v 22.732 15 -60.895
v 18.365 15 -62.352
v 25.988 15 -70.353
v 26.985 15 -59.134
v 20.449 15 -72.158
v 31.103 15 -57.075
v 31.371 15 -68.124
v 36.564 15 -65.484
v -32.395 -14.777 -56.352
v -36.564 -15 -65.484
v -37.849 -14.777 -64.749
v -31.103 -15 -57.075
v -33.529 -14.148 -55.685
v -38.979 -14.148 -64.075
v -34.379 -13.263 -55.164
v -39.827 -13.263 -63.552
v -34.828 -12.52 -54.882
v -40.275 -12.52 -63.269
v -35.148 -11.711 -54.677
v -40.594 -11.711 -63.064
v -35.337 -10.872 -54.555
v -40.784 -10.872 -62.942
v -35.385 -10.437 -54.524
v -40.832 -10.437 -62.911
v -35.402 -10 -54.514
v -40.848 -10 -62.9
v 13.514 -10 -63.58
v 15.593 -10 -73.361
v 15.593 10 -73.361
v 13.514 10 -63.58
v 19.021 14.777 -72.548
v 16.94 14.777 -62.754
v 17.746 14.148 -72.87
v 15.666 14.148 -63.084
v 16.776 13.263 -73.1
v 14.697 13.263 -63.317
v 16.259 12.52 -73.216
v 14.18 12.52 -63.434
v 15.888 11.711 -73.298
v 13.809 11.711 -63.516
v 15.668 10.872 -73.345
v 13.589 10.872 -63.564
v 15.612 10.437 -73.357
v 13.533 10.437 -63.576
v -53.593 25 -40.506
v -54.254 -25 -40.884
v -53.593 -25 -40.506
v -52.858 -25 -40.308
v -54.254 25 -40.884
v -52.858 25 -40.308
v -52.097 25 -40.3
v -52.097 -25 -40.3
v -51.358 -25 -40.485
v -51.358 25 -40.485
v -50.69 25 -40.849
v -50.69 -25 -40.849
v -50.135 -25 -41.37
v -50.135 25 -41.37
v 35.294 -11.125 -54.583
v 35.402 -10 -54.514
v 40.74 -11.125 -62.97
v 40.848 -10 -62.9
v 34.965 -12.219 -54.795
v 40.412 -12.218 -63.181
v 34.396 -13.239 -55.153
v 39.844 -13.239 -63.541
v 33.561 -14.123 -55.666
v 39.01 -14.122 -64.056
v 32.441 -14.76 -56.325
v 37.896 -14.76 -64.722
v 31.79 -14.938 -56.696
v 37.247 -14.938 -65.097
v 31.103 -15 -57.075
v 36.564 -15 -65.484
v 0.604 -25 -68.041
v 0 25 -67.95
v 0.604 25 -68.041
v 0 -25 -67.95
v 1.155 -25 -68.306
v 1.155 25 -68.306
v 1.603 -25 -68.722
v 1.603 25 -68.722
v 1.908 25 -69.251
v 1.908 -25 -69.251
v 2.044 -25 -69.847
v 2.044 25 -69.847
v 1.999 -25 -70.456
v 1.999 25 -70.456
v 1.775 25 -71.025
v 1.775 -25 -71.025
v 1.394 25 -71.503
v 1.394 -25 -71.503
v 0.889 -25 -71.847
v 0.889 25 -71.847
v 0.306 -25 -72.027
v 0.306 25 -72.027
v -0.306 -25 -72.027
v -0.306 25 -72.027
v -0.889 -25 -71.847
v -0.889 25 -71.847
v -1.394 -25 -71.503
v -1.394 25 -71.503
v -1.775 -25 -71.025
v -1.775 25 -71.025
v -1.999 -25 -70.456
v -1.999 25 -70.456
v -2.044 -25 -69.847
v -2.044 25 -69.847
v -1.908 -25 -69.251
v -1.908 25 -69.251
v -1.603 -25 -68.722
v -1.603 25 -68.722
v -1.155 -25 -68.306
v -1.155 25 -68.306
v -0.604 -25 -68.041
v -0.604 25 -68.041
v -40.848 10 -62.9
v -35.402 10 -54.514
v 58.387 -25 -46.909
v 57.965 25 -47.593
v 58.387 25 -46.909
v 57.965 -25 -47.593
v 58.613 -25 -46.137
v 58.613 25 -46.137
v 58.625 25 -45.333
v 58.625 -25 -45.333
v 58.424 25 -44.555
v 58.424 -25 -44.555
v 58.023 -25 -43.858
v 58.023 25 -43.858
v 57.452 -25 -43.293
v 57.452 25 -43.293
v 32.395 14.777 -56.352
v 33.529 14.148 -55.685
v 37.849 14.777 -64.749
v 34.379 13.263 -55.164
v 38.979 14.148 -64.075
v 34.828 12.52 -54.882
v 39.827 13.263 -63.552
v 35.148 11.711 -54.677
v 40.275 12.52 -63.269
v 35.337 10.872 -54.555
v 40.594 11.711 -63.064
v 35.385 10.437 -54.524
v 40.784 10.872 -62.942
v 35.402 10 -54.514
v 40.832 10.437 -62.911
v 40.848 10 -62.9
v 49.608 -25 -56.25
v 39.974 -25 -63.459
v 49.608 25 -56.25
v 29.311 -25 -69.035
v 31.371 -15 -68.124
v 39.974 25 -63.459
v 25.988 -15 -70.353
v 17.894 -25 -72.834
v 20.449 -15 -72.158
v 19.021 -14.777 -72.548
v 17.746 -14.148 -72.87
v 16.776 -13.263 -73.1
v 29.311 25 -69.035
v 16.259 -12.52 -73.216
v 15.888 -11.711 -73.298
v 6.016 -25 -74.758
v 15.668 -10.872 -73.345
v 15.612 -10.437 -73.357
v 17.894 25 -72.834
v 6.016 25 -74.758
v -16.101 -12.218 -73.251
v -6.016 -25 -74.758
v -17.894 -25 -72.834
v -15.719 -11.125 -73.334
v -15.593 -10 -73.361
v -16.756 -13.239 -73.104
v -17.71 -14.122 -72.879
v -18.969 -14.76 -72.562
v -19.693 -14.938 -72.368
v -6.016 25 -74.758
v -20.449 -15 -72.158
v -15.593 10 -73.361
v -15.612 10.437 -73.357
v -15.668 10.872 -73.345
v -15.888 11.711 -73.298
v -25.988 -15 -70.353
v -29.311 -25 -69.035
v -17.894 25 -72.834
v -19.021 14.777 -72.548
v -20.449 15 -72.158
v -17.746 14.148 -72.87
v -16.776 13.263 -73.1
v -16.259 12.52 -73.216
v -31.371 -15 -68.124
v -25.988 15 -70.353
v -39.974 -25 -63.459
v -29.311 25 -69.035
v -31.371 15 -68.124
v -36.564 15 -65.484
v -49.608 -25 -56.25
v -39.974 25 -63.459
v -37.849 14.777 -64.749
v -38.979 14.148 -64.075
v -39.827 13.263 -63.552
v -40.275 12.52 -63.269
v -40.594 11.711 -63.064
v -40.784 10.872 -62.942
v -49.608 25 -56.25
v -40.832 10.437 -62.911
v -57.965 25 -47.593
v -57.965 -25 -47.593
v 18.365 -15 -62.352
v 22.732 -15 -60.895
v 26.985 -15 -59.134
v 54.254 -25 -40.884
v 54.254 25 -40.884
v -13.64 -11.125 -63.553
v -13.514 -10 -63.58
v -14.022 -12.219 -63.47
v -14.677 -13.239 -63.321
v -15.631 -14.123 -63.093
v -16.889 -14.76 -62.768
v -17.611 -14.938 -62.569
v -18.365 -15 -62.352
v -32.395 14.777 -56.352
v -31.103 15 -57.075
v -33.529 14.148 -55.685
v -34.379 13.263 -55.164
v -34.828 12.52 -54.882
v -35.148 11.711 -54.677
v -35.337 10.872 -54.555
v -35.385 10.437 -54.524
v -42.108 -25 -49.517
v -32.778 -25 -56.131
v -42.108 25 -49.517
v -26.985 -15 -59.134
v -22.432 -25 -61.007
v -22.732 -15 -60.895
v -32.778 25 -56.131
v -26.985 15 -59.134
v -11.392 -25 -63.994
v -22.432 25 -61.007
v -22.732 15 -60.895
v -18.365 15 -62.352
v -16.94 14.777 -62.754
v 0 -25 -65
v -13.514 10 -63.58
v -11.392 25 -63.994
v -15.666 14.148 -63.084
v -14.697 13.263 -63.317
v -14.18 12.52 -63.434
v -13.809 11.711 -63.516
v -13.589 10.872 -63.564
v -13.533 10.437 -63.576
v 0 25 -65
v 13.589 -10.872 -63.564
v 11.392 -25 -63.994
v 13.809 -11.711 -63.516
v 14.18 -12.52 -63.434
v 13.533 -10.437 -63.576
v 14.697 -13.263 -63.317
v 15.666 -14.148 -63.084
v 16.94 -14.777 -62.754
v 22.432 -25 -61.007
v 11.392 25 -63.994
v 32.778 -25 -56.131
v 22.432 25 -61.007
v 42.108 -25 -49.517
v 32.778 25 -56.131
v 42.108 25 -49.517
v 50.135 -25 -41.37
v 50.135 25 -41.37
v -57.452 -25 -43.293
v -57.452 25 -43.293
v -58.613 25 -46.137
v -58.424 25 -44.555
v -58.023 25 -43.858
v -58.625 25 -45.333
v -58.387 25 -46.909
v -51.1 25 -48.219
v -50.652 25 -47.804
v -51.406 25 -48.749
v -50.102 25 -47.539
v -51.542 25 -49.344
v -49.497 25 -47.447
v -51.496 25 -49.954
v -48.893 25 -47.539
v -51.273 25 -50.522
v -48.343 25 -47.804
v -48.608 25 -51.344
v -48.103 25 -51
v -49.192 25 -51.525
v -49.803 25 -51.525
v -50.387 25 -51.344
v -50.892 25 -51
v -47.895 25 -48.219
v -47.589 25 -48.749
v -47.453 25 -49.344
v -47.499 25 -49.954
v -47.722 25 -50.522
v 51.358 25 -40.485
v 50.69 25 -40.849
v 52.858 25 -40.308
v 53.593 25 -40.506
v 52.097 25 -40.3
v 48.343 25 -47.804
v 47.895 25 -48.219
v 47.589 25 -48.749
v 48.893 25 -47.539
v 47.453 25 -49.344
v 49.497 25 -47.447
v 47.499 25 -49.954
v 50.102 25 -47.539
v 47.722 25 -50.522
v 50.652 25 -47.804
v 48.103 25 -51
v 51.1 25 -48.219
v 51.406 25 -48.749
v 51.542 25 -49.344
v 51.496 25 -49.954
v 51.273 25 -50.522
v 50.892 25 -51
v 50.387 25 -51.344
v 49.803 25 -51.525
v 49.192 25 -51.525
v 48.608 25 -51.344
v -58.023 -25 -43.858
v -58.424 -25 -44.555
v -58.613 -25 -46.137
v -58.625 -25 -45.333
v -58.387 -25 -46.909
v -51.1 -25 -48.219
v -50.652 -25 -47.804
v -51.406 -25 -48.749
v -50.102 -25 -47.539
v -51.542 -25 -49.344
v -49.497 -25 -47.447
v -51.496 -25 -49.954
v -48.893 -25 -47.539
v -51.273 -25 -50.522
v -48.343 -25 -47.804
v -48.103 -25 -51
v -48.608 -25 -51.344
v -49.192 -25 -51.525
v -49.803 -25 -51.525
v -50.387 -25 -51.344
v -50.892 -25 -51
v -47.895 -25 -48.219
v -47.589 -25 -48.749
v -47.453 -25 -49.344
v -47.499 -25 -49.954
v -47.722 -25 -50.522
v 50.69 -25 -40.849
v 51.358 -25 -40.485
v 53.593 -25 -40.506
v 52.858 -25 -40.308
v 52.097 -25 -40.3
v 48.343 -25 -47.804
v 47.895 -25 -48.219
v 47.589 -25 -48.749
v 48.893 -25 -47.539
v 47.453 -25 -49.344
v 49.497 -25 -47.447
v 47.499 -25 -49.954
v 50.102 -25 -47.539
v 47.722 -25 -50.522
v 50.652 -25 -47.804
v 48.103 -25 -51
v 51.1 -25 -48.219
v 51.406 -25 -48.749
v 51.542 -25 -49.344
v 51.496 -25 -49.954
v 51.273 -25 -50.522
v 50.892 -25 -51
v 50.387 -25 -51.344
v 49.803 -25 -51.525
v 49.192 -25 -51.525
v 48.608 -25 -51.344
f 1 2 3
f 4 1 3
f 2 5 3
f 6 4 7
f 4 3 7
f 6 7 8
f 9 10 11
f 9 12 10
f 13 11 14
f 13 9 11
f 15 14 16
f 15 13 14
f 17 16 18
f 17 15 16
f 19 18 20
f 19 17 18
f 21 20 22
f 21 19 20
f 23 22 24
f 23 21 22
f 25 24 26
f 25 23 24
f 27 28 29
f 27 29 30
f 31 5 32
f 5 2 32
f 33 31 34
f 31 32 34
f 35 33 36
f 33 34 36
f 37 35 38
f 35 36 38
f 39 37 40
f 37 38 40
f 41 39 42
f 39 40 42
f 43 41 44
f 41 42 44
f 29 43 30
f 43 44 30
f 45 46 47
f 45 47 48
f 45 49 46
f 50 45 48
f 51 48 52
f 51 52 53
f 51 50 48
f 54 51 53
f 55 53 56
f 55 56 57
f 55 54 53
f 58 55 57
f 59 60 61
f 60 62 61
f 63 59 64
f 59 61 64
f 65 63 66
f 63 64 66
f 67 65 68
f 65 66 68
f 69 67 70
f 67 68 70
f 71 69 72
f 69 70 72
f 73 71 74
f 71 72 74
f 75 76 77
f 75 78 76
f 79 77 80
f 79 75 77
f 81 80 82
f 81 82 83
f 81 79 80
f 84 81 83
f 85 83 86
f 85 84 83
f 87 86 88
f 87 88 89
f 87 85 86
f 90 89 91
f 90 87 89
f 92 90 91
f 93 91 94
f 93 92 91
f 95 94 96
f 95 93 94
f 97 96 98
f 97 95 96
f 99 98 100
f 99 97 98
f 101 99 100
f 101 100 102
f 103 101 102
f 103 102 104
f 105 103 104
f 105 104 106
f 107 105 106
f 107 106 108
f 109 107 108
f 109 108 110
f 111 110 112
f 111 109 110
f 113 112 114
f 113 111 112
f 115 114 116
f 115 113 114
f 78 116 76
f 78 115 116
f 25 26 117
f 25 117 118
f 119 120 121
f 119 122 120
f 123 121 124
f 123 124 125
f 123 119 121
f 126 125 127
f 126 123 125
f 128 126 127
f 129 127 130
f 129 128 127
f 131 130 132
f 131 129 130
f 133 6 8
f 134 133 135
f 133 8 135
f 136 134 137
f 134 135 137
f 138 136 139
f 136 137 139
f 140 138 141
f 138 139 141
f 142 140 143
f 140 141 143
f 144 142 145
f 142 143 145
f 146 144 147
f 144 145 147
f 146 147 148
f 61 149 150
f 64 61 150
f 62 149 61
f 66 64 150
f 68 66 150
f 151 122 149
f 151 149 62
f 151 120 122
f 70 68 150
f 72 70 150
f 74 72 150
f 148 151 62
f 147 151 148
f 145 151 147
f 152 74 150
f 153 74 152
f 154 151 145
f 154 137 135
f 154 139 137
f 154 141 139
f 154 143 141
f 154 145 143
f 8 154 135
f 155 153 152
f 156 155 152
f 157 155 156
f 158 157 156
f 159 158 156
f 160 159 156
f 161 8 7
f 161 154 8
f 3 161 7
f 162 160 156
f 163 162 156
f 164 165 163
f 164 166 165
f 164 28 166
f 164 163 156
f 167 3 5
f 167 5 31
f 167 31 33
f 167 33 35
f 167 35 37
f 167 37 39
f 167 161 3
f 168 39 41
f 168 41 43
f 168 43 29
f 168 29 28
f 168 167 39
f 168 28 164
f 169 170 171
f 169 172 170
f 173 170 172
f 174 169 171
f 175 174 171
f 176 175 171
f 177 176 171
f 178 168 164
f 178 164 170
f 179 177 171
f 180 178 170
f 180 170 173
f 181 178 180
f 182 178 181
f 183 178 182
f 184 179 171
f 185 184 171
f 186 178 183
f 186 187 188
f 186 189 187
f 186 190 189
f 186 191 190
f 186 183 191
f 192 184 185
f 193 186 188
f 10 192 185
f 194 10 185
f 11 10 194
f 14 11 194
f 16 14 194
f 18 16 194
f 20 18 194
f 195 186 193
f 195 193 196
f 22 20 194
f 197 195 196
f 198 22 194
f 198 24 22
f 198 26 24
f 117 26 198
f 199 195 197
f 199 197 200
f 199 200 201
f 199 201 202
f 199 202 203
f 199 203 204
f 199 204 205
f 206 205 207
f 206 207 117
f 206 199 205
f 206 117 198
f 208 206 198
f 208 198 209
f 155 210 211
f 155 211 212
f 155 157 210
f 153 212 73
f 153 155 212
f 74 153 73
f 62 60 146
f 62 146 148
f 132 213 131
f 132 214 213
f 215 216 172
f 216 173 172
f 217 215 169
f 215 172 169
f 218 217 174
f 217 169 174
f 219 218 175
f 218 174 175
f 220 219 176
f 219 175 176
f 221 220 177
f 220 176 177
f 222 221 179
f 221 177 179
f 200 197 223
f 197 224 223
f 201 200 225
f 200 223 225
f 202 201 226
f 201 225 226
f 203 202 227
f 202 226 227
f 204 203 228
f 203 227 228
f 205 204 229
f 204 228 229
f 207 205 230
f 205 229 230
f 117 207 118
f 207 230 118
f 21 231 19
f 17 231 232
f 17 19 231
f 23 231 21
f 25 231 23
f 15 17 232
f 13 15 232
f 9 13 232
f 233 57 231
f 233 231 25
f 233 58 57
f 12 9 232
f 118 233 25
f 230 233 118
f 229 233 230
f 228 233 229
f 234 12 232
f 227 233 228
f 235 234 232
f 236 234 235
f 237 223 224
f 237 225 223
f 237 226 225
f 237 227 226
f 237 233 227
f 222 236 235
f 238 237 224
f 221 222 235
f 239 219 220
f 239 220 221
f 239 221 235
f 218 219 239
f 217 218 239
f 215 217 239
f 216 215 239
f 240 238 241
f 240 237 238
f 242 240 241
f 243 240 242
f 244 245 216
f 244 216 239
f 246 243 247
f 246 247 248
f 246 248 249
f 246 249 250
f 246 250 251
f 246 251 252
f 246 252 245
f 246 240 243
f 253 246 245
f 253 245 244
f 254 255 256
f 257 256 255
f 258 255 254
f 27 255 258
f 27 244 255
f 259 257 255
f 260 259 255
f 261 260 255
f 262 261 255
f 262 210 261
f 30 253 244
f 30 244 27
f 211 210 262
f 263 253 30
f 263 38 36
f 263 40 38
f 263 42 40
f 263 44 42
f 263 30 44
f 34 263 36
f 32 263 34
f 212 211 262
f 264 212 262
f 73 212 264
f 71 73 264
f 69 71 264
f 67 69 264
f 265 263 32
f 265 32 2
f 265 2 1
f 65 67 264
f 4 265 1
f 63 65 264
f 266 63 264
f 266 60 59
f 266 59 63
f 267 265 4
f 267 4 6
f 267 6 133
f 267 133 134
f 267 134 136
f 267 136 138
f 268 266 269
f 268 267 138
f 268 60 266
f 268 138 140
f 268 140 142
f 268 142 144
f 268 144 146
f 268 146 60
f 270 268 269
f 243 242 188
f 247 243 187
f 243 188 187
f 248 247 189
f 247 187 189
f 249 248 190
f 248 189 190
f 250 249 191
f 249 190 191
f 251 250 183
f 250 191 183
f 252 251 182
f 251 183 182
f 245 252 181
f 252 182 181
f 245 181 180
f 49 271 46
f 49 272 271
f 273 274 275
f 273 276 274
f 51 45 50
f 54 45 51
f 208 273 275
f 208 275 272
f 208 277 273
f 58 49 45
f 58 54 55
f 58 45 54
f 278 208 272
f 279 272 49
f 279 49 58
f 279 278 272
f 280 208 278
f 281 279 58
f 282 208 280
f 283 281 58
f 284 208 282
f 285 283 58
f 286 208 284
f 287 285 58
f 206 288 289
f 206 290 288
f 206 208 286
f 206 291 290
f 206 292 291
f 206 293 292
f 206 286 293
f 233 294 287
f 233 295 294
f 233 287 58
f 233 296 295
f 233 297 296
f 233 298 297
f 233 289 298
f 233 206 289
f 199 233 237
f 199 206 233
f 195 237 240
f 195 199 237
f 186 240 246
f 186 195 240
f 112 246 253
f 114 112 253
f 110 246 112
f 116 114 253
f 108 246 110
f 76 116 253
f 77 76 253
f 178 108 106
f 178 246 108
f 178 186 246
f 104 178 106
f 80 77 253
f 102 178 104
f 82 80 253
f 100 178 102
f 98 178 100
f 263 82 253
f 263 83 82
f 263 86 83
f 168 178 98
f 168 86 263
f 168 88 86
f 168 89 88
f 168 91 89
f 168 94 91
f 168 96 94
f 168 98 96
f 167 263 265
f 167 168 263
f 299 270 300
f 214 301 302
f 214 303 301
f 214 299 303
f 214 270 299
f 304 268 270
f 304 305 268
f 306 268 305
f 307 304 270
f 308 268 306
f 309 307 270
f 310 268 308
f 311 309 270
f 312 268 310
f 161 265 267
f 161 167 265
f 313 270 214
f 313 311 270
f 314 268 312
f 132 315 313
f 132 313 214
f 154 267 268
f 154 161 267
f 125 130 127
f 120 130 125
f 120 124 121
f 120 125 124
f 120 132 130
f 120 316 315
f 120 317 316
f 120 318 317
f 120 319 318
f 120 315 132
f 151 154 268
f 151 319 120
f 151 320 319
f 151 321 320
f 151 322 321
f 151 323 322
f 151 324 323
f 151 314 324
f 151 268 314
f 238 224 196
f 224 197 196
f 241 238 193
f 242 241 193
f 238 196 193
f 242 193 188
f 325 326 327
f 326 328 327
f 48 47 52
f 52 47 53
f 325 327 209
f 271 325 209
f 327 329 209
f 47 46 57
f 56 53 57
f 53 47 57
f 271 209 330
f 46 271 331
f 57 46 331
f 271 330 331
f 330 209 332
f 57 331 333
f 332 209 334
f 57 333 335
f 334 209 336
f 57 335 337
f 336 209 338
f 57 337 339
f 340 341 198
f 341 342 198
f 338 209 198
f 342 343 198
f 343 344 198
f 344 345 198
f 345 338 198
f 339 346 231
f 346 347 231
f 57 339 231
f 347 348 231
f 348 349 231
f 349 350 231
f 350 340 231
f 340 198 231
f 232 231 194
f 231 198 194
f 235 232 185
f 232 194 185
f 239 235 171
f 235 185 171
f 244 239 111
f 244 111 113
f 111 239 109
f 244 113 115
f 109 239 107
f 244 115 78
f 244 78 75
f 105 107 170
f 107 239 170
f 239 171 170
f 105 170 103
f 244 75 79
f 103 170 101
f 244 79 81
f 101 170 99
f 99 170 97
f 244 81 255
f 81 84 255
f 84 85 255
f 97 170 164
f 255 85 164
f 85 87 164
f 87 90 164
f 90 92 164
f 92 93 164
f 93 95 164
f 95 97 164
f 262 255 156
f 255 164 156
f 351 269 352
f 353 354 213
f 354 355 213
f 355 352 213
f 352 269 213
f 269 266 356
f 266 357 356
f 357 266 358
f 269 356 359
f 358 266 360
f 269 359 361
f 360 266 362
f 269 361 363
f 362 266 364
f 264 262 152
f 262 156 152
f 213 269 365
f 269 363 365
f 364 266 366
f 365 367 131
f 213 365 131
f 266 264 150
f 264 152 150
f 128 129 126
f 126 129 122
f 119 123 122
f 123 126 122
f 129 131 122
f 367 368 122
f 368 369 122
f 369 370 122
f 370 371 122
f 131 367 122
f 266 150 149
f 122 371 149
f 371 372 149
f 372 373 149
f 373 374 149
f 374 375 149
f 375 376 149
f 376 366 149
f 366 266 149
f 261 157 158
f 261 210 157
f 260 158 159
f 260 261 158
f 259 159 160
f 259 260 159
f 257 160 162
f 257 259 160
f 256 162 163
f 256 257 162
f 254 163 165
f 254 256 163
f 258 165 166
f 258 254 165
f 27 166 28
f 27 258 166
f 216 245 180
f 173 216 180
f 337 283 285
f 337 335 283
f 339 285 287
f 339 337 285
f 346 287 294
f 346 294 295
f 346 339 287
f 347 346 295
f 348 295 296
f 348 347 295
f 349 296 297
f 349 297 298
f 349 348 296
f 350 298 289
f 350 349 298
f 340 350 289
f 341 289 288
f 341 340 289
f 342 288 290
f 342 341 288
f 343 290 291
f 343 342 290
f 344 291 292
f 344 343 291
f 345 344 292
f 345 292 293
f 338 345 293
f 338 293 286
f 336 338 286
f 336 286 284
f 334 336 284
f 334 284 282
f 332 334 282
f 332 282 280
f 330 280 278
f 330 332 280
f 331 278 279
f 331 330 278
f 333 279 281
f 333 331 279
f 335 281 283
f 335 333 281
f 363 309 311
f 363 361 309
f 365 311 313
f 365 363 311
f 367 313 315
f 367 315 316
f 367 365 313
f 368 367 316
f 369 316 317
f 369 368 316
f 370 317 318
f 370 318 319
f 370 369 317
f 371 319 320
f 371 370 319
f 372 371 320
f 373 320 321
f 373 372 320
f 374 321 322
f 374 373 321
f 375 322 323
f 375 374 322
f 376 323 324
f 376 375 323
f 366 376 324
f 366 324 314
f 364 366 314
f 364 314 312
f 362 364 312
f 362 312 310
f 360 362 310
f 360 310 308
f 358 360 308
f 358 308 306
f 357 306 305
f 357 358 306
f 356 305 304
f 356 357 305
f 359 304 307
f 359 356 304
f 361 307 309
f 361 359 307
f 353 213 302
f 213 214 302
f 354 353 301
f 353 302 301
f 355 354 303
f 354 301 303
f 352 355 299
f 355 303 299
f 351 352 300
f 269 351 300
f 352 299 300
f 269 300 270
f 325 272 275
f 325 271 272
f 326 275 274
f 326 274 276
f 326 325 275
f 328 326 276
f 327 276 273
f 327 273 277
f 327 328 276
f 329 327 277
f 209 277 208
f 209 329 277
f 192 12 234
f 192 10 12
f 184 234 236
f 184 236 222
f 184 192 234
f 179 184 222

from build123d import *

# Parameters (mm, degrees)
SKETCH_1_R          = 2.05
EXTRUDE_1_DEPTH     = 25
FILLET_2_R          = 3
CUT_EXTRUDE_1_DEPTH = 15
FILLET_3_R          = 5


with BuildPart() as part:
    # 草图1 → 凸台-拉伸1 (new, symmetric)
    with BuildSketch(Plane(origin=(0, 0, 0), x_dir=(1, 0, 0), z_dir=(0, 1, 0))):
        with BuildLine():
            Line((-59.897663254, 45.136126736), (-51.911308153, 39.117976505))
            ThreePointArc((-51.911308153, 39.117976505), (0, 65), (51.911308153, 39.117976505))
            Line((51.911308153, 39.117976505), (59.897663254, 45.136126736))
            ThreePointArc((59.897663254, 45.136126736), (0, 75), (-59.897663254, 45.136126736))
        make_face()
        with Locations(Location((-49.497474683, 49.497474683, 0), (0, 0, 270))):
            Circle(SKETCH_1_R, mode=Mode.SUBTRACT)
        with Locations(Location((0, 70, 0), (0, 0, 270))):
            Circle(SKETCH_1_R, mode=Mode.SUBTRACT)
        with Locations(Location((49.497474683, 49.497474683, 0), (0, 0, 270))):
            Circle(SKETCH_1_R, mode=Mode.SUBTRACT)
    extrude(amount=EXTRUDE_1_DEPTH, both=True)

    # 圆角2
    fillet_2_edges = [part.edges().sort_by_distance(p)[0] for p in [
        (-51.911308153, 0, -39.117976505),
        (-59.897663254, 0, -45.136126736),
        (59.897663254, 0, -45.136126736),
        (51.911308153, 0, -39.117976505),
    ]]
    fillet(fillet_2_edges, radius=FILLET_2_R)

    # 草图2 → 切除-拉伸1 (cut, symmetric)
    with BuildSketch(Plane(origin=(0, 0, 0), x_dir=(1, 0, 0), z_dir=(0, 1, 0))):
        with BuildLine():
            Line((-40.847927626, 62.900292596), (-35.401537276, 54.513586916))
            ThreePointArc((-35.401537276, 54.513586916), (-24.874423104, 60.052169613), (-13.514259903, 63.579594048))
            Line((-13.514259903, 63.579594048), (-15.593376811, 73.361070055))
            ThreePointArc((-15.593376811, 73.361070055), (-28.701257427, 69.290964938), (-40.847927626, 62.900292596))
        make_face()
        with BuildLine():
            ThreePointArc((13.514259903, 63.579594048), (24.874423104, 60.052169613), (35.401537276, 54.513586916))
            Line((35.401537276, 54.513586916), (40.847927626, 62.900292596))
            ThreePointArc((40.847927626, 62.900292596), (28.701257427, 69.290964938), (15.593376811, 73.361070055))
            Line((15.593376811, 73.361070055), (13.514259903, 63.579594048))
        make_face()
    extrude(amount=CUT_EXTRUDE_1_DEPTH, both=True, mode=Mode.SUBTRACT)

    # 圆角3
    fillet_3_edges = [part.edges().sort_by_distance(p)[0] for p in [
        (-38.124732451, 15, -58.706939756),
        (-14.553818357, -15, -68.470332051),
        (-38.124732451, -15, -58.706939756),
        (-14.553818357, 15, -68.470332051),
        (14.553818357, 15, -68.470332051),
        (38.124732451, -15, -58.706939756),
        (14.553818357, -15, -68.470332051),
        (38.124732451, 15, -58.706939756),
    ]]
    fillet(fillet_3_edges, radius=FILLET_3_R)


solid = part.part
